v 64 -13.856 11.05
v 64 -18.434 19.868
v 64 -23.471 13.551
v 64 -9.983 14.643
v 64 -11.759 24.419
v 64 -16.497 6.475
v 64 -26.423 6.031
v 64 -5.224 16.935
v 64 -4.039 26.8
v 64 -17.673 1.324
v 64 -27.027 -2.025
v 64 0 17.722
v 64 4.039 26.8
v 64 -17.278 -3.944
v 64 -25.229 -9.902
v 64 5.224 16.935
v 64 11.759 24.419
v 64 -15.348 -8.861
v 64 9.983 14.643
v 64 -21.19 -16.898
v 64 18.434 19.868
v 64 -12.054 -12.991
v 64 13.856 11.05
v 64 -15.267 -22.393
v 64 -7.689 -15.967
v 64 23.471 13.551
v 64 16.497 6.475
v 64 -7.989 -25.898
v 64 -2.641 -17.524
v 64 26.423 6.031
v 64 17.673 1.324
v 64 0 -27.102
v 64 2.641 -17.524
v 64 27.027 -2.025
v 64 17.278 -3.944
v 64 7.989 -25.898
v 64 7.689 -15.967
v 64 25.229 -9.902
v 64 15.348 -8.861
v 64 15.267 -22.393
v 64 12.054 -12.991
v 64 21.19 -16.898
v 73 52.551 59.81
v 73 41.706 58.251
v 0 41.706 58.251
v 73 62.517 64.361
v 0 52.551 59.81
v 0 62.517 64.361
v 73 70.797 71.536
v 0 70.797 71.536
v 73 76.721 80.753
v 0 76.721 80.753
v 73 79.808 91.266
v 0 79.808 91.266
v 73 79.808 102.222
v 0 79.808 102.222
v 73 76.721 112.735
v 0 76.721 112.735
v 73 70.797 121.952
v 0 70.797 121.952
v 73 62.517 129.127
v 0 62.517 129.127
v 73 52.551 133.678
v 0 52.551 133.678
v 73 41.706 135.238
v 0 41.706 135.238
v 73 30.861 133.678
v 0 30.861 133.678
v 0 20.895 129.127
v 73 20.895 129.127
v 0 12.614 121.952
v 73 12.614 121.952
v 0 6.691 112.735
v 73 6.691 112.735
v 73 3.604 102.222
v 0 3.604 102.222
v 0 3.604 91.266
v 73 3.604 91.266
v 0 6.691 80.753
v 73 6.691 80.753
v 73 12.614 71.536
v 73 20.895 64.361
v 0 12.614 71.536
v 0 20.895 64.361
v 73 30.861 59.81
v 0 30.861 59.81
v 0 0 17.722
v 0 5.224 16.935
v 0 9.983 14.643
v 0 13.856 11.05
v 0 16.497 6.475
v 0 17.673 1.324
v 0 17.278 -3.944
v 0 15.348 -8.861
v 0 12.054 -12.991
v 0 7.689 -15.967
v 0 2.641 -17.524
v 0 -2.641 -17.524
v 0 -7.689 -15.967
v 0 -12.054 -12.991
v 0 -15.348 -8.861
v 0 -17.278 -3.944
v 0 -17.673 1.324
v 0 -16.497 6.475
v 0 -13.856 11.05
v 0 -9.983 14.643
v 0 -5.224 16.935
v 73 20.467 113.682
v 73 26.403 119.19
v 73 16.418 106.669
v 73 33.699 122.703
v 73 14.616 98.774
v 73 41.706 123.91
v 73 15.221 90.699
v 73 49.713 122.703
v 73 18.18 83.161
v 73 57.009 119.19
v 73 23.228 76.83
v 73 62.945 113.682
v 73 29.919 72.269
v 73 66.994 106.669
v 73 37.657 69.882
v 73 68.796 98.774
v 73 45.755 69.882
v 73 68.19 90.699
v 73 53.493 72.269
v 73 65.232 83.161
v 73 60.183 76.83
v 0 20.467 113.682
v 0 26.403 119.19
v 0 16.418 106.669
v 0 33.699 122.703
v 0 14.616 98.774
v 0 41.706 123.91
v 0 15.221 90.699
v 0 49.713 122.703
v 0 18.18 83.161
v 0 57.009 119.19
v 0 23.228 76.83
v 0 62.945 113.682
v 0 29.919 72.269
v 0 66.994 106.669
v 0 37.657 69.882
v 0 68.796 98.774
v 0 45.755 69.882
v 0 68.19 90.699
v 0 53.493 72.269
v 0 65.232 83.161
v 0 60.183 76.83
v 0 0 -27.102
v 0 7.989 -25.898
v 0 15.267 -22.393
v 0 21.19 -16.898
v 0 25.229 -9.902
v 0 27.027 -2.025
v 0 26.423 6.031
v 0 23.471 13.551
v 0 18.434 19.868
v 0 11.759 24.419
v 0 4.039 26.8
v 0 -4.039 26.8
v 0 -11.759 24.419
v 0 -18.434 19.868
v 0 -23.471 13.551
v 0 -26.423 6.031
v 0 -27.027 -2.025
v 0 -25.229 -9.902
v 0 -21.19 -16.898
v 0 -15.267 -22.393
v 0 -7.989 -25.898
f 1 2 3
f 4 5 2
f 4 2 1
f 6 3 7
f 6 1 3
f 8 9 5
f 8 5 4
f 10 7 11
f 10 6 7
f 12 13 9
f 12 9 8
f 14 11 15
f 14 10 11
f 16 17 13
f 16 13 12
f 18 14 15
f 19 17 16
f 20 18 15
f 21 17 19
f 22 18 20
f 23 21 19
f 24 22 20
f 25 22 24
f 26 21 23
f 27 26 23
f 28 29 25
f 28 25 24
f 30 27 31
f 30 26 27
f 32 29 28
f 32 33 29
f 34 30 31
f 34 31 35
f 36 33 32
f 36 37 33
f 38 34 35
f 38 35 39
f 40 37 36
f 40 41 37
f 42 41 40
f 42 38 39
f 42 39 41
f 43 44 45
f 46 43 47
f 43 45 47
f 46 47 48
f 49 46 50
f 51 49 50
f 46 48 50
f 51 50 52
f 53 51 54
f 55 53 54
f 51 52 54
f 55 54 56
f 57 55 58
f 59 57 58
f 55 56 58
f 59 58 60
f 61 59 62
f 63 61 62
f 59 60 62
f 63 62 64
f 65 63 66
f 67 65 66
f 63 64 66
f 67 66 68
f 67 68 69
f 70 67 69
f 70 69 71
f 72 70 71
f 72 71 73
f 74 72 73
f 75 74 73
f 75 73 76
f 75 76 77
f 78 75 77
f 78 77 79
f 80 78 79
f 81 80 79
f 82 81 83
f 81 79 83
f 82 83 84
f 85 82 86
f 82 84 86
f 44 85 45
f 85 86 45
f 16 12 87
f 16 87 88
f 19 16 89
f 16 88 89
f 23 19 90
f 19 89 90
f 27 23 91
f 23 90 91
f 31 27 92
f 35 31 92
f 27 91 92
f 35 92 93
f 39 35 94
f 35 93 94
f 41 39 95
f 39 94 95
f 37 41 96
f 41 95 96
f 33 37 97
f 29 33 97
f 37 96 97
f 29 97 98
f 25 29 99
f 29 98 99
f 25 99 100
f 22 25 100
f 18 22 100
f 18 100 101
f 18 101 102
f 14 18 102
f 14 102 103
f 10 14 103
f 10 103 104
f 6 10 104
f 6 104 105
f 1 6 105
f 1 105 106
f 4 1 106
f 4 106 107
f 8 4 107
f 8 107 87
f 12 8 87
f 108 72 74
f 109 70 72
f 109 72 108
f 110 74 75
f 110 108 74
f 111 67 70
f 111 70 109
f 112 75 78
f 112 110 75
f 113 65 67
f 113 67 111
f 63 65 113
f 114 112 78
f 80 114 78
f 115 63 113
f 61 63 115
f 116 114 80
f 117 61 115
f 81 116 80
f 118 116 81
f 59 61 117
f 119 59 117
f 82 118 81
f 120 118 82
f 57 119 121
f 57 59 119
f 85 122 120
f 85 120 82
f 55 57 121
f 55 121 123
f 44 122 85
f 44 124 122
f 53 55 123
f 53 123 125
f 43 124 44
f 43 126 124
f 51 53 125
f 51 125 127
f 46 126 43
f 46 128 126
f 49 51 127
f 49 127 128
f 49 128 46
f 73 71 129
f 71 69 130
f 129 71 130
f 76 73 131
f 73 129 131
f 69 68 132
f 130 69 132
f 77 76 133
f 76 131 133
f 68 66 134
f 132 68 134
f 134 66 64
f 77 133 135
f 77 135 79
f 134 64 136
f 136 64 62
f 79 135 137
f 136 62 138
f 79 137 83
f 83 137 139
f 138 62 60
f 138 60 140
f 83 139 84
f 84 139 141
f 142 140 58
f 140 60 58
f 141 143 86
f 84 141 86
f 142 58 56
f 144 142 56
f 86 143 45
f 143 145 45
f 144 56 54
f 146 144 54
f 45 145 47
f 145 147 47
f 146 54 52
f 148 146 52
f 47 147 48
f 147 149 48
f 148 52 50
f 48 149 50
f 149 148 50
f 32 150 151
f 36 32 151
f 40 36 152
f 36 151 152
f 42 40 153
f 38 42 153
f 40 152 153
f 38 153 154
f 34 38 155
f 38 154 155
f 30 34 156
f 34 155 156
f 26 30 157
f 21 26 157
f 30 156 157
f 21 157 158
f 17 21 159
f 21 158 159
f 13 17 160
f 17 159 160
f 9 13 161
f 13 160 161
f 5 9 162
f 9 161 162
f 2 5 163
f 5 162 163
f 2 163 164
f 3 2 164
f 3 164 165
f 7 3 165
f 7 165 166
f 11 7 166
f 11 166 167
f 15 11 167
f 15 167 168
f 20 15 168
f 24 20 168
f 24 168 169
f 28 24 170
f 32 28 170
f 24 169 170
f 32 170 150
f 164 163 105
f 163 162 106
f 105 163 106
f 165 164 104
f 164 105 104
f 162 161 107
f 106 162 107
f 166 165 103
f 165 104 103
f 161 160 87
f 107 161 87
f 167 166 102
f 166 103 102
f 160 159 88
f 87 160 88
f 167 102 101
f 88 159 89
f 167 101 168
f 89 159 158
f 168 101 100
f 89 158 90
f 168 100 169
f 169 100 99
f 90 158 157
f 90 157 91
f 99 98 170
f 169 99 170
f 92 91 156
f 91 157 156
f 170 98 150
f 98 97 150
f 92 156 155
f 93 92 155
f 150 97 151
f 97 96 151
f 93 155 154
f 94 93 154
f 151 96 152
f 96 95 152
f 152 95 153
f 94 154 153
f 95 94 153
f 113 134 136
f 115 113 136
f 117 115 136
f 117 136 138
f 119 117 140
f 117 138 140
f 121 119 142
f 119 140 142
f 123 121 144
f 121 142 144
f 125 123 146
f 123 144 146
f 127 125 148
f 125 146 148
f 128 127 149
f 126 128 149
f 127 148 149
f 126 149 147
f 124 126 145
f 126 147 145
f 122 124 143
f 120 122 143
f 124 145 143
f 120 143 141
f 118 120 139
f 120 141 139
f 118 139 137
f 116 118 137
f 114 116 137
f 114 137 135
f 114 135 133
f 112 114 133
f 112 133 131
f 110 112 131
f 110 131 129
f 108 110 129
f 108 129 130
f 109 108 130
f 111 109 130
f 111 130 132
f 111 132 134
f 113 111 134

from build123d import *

# Parameters (mm, degrees)
SKETCH2_R           = 27.102495449
BOSS_EXTRUDE1_DEPTH = 64
SKETCH3_R           = 38.493502763
BOSS_EXTRUDE2_DEPTH = 73
SKETCH7_R           = 17.722141742
CUT_EXTRUDE1_DEPTH  = 95
SKETCH8_R           = 27.165719082
CUT_EXTRUDE2_DEPTH  = 95


with BuildPart() as part:
    # Sketch2 → Boss-Extrude1 (new body)
    with BuildSketch(Plane(origin=(0, 0, 0), x_dir=(0, 0, -1), z_dir=(1, 0, 0))):
        Circle(SKETCH2_R)
    extrude(amount=BOSS_EXTRUDE1_DEPTH)

    # Sketch7 → Cut-Extrude1 (cut)
    with BuildSketch(Plane.ZY):
        Circle(SKETCH7_R)
    extrude(amount=-CUT_EXTRUDE1_DEPTH, mode=Mode.SUBTRACT)


with BuildPart() as body_2:
    # Sketch3 → Boss-Extrude2 (new body)
    with BuildSketch(Plane(origin=(0, 0, 0), x_dir=(0, 0, -1), z_dir=(1, 0, 0))):
        with Locations((-96.74416718, 41.705825758)):
            Circle(SKETCH3_R)
    extrude(amount=BOSS_EXTRUDE2_DEPTH)

    # Sketch8 → Cut-Extrude2 (cut)
    with BuildSketch(Plane.ZY):
        with Locations((96.74416718, 41.705825758)):
            Circle(SKETCH8_R)
    extrude(amount=-CUT_EXTRUDE2_DEPTH, mode=Mode.SUBTRACT)


solid = Compound([part.part, body_2.part])
